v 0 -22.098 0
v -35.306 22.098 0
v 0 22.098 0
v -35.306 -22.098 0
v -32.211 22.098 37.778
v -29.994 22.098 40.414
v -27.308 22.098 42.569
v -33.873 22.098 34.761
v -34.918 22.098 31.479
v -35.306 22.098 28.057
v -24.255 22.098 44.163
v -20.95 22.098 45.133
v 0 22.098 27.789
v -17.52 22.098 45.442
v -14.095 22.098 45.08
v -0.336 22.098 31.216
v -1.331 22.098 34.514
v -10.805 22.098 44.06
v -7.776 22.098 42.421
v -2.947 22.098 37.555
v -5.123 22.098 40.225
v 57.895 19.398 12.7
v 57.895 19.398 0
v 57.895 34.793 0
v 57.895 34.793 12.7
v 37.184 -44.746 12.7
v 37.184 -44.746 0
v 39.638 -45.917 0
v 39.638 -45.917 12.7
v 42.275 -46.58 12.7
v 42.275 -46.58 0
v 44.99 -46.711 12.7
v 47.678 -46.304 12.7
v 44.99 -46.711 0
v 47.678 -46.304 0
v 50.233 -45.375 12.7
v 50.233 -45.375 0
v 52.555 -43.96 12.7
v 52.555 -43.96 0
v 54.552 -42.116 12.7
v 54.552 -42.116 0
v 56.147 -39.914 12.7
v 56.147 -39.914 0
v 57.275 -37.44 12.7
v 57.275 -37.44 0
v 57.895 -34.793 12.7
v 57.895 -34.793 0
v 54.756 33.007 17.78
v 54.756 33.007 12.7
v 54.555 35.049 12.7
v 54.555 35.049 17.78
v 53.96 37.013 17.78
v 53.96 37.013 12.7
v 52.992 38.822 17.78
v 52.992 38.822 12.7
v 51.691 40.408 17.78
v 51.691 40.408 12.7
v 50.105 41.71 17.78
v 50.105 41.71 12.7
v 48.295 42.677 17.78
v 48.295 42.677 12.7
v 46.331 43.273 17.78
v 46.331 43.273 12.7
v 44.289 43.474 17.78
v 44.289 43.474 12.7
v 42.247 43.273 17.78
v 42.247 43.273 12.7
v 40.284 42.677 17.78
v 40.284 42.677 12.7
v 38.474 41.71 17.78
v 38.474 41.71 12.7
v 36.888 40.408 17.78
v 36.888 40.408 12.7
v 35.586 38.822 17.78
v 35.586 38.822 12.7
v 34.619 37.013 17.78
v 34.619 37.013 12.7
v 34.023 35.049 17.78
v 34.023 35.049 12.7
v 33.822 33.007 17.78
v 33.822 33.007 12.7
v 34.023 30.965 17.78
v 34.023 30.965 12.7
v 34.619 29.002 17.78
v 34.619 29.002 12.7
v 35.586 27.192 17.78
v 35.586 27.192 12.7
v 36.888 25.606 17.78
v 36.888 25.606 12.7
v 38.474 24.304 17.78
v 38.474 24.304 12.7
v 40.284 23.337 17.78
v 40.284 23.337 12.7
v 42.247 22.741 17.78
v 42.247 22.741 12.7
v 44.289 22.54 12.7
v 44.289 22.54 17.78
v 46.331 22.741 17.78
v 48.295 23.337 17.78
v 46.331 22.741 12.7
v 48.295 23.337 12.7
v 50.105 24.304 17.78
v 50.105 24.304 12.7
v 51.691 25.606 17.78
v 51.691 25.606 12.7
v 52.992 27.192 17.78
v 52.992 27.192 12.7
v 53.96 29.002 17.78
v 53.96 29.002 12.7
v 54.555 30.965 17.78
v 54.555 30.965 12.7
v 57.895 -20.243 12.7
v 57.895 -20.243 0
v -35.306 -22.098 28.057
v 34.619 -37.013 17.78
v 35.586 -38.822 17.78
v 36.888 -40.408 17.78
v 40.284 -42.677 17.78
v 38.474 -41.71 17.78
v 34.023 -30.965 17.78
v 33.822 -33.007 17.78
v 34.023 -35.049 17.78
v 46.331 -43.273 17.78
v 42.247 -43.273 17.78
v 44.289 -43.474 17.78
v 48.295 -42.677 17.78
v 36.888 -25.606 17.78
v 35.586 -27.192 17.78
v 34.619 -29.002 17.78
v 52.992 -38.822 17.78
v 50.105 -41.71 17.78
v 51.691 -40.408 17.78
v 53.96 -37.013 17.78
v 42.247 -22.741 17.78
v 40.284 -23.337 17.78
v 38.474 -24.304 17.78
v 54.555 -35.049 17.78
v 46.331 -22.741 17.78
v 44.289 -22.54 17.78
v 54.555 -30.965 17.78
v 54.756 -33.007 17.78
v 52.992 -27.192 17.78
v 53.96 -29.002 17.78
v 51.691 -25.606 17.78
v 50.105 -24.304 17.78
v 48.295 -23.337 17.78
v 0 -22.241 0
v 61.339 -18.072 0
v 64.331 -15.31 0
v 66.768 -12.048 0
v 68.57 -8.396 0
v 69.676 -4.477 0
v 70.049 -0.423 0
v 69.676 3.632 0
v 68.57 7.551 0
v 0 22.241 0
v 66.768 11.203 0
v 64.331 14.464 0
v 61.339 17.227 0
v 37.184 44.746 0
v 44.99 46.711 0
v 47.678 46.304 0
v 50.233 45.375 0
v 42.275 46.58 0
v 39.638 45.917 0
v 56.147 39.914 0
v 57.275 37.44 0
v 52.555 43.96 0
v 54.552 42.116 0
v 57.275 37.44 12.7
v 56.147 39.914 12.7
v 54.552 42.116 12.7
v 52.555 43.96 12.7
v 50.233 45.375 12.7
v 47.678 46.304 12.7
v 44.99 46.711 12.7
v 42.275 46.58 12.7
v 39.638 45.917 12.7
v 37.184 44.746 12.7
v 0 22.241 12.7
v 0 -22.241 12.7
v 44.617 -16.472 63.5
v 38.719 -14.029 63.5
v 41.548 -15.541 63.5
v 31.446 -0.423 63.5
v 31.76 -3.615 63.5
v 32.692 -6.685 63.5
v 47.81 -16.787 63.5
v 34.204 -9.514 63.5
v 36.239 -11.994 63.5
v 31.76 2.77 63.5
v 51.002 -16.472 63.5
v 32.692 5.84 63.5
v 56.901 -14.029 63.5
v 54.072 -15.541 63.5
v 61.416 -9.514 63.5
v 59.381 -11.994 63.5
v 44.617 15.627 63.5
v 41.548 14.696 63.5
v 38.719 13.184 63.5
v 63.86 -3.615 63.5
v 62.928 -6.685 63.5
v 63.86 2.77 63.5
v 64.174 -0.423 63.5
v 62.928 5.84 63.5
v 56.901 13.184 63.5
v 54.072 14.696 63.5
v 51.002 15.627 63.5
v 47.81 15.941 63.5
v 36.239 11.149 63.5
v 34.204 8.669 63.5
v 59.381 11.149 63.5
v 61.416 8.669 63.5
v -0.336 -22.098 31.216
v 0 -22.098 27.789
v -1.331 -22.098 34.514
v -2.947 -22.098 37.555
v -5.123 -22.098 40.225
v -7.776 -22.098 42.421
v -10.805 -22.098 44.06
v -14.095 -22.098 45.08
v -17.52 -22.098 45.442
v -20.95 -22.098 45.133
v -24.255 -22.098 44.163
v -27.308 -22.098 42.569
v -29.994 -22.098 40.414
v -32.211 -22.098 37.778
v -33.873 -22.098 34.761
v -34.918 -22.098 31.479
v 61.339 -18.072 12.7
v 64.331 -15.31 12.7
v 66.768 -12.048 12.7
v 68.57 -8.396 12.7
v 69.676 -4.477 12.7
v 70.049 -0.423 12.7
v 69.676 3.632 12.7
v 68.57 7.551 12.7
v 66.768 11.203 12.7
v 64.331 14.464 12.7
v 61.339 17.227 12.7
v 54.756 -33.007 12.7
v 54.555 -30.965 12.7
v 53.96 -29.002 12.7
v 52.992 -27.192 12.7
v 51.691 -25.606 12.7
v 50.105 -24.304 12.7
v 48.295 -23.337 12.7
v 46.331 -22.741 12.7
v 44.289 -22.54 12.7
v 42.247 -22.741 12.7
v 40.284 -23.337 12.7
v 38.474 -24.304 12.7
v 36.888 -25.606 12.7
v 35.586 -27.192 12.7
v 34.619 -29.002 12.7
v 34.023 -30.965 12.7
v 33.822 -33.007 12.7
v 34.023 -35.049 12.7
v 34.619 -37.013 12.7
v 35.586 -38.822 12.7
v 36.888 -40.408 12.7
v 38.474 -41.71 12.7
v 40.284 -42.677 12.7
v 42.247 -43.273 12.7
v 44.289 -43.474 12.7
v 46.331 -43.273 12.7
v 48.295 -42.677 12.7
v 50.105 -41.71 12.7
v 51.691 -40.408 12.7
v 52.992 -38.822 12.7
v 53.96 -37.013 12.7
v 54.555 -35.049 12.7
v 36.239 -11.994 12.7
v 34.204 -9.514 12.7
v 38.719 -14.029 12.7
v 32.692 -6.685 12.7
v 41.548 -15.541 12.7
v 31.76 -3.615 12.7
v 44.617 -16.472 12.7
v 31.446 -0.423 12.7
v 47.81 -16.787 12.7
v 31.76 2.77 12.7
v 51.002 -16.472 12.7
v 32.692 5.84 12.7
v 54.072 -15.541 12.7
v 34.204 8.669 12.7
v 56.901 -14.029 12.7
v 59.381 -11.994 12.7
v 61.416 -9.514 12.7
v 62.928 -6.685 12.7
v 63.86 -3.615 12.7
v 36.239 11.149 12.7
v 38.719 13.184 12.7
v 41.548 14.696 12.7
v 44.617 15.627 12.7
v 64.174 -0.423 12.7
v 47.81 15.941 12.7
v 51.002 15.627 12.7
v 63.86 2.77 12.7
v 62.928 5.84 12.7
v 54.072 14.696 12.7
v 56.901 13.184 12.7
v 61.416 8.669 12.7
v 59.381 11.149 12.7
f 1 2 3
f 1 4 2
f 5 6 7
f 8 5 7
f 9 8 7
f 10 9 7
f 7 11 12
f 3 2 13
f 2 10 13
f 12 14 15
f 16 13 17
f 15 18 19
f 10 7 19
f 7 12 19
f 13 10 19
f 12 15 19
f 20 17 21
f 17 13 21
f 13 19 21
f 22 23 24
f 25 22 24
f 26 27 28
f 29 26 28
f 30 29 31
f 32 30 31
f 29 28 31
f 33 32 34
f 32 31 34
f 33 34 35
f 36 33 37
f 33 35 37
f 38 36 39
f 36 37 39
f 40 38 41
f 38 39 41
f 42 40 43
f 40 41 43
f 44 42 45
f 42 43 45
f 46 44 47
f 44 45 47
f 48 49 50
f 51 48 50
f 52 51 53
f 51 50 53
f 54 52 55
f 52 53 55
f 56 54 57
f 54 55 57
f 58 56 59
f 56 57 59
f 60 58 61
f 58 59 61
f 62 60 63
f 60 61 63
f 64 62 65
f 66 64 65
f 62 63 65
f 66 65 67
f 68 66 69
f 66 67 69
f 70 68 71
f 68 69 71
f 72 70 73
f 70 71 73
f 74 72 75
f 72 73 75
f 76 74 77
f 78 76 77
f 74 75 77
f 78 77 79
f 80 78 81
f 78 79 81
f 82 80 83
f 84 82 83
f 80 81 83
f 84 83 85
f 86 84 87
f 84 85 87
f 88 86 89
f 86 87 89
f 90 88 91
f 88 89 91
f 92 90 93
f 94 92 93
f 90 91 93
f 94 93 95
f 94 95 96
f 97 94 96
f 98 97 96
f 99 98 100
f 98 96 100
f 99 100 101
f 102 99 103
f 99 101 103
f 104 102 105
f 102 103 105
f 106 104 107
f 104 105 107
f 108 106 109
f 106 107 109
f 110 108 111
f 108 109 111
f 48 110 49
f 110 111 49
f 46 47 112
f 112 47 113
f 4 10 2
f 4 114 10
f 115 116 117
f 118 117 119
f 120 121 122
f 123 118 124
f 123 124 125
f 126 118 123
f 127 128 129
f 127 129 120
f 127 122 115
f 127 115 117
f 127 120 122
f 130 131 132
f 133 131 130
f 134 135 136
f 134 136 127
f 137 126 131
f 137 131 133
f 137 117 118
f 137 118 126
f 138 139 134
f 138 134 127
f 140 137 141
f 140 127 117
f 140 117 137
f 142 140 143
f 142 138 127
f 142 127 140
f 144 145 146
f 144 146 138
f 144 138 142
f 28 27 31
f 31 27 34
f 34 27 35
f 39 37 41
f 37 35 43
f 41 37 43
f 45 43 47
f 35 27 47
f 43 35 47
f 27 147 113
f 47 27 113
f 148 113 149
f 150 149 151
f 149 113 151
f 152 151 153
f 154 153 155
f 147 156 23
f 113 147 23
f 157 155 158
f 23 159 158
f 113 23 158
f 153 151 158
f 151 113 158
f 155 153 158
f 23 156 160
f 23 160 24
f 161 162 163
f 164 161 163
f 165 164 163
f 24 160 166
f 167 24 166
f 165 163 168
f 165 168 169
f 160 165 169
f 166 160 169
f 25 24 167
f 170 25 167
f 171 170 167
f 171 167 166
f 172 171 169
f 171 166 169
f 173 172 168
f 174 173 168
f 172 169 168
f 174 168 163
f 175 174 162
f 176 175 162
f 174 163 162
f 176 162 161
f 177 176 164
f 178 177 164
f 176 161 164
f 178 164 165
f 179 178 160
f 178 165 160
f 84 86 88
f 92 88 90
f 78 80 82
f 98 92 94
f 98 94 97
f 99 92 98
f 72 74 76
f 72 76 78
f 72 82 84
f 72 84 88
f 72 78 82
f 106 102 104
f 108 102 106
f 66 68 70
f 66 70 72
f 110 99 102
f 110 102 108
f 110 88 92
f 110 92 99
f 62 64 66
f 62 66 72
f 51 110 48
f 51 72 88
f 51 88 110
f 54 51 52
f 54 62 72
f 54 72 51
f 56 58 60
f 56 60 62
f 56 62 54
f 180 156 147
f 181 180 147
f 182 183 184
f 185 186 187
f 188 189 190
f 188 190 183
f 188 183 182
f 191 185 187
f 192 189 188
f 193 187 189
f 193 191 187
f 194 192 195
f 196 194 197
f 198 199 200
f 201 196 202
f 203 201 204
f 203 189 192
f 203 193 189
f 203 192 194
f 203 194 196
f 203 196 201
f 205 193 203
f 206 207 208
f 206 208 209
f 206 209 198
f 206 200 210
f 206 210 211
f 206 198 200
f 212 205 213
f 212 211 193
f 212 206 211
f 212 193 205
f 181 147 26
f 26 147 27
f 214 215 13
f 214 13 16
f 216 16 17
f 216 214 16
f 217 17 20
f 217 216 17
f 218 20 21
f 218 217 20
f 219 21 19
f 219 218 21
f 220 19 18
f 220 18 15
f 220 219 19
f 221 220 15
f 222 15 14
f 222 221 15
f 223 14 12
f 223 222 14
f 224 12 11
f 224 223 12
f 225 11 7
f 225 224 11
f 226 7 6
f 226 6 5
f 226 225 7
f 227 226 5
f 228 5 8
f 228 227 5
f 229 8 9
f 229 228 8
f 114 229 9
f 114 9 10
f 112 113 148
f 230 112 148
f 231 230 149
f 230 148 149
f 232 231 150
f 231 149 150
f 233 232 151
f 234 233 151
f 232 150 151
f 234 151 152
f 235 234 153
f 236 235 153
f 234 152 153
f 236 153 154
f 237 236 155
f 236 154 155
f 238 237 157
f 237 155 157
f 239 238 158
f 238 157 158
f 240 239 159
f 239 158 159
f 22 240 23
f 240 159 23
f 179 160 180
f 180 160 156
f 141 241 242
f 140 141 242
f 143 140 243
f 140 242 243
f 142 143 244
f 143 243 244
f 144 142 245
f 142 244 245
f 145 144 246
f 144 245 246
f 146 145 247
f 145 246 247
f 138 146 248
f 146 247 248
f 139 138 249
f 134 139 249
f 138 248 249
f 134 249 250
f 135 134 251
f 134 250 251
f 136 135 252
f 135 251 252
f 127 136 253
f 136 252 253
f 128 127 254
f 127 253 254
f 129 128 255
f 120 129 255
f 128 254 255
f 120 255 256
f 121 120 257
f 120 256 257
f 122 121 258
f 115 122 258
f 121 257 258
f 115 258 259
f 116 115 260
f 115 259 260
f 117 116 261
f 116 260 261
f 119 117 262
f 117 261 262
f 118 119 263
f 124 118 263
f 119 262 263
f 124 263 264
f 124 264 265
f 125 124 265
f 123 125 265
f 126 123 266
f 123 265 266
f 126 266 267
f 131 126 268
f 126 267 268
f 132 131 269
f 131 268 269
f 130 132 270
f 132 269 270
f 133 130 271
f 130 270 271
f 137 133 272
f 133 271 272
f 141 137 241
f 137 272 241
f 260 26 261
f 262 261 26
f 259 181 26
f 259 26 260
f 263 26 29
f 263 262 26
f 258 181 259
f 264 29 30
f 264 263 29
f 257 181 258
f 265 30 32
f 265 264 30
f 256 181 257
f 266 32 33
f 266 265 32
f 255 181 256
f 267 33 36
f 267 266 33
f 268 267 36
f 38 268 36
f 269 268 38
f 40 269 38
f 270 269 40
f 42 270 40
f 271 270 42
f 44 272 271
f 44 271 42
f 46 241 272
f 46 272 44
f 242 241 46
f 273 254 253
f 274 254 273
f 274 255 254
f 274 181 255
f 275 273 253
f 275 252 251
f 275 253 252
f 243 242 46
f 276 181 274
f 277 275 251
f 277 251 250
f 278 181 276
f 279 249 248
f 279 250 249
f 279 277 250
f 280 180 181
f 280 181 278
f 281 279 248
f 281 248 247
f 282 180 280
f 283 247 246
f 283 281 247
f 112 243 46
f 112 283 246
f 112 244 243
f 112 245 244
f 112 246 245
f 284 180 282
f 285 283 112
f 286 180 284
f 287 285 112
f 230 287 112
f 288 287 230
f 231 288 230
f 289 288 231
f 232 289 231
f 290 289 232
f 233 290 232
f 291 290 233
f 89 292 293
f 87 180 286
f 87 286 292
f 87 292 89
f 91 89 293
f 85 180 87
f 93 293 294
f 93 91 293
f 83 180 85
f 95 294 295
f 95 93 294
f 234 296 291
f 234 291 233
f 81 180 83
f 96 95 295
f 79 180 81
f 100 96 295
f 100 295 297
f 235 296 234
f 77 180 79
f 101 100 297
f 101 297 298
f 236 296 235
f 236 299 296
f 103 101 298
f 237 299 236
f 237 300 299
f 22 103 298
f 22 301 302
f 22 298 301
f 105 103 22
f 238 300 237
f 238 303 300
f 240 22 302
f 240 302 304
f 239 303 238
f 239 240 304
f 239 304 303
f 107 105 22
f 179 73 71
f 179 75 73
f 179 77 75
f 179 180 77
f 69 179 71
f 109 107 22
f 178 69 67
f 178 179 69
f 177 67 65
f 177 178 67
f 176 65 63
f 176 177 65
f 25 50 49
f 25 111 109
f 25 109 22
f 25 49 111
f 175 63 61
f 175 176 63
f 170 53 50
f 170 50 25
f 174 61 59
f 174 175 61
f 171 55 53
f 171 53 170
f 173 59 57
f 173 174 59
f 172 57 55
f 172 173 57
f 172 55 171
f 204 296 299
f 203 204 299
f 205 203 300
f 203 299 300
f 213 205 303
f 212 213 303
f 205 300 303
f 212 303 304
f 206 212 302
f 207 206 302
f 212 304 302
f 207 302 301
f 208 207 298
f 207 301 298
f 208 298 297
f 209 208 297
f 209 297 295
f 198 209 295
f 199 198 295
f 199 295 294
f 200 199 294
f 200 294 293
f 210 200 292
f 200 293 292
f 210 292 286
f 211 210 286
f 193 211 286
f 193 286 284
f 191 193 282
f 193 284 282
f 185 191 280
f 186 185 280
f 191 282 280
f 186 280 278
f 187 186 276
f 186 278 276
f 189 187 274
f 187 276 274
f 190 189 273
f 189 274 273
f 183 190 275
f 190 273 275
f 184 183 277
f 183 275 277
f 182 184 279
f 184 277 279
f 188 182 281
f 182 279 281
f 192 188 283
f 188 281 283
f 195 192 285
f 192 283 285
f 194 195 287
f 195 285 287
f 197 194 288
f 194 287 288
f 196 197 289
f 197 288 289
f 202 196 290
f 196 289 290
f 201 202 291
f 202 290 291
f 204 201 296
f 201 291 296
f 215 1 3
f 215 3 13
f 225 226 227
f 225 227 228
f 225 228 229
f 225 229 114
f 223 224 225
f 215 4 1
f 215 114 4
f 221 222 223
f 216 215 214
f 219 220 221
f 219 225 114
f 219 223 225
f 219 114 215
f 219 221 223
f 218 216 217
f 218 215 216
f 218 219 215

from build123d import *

# Parameters (mm, degrees)
F1_DEPTH = 12.7
F3_DEPTH = 22.098
F4_R     = 10.467078
F5_DEPTH = 5.08
F4_R_2   = 16.364027
F6_DEPTH = 50.8


with BuildPart() as f1:
    # F0 (on Top) → F1 (new body)
    with BuildSketch(Plane.XY):
        with BuildLine():
            Line((37.184291, 44.746361), (0, 22.240981))
            Line((0, 22.240981), (0, -22.240981))
            Line((0, -22.240981), (37.184291, -44.746361))
            ThreePointArc((37.184291, -44.746361), (50.233245, -45.374882), (57.894561, -34.793083))
            Line((57.894561, -34.793083), (57.894561, -20.243236))
            ThreePointArc((57.894561, -20.243236), (70.048598, -0.422585), (57.894561, 19.398067))
            Line((57.894561, 19.398067), (57.894561, 34.793083))
            ThreePointArc((57.894561, 34.793083), (50.233245, 45.374882), (37.184291, 44.746361))
        make_face()
    extrude(amount=F1_DEPTH)

    # F4 (on face) → F5 (join)
    with BuildSketch(Plane.XY.offset(12.7)):
        with Locations((44.289342, -33.007113)):
            Circle(F4_R)
        with Locations((44.289342, 33.007113)):
            Circle(F4_R)
    extrude(amount=F5_DEPTH)

    # F4 (on face) → F6 (join)
    with BuildSketch(Plane.XY.offset(12.7)):
        with Locations((47.809943, -0.422585)):
            Circle(F4_R_2)
    extrude(amount=F6_DEPTH)


with BuildPart() as f3:
    # F2 (on Front) → F3 (new body, symmetric)
    with BuildSketch(Plane.XZ):
        with BuildLine():
            Line((-35.306428, 0), (0, 0))
            Line((0, 0), (0, 27.788708))
            ThreePointArc((0, 27.788708), (-17.519985, 45.442432), (-35.306428, 28.057199))
            Line((-35.306428, 28.057199), (-35.306428, 0))
        make_face()
    extrude(amount=F3_DEPTH, both=True)


solid = Compound([f1.part, f3.part])
